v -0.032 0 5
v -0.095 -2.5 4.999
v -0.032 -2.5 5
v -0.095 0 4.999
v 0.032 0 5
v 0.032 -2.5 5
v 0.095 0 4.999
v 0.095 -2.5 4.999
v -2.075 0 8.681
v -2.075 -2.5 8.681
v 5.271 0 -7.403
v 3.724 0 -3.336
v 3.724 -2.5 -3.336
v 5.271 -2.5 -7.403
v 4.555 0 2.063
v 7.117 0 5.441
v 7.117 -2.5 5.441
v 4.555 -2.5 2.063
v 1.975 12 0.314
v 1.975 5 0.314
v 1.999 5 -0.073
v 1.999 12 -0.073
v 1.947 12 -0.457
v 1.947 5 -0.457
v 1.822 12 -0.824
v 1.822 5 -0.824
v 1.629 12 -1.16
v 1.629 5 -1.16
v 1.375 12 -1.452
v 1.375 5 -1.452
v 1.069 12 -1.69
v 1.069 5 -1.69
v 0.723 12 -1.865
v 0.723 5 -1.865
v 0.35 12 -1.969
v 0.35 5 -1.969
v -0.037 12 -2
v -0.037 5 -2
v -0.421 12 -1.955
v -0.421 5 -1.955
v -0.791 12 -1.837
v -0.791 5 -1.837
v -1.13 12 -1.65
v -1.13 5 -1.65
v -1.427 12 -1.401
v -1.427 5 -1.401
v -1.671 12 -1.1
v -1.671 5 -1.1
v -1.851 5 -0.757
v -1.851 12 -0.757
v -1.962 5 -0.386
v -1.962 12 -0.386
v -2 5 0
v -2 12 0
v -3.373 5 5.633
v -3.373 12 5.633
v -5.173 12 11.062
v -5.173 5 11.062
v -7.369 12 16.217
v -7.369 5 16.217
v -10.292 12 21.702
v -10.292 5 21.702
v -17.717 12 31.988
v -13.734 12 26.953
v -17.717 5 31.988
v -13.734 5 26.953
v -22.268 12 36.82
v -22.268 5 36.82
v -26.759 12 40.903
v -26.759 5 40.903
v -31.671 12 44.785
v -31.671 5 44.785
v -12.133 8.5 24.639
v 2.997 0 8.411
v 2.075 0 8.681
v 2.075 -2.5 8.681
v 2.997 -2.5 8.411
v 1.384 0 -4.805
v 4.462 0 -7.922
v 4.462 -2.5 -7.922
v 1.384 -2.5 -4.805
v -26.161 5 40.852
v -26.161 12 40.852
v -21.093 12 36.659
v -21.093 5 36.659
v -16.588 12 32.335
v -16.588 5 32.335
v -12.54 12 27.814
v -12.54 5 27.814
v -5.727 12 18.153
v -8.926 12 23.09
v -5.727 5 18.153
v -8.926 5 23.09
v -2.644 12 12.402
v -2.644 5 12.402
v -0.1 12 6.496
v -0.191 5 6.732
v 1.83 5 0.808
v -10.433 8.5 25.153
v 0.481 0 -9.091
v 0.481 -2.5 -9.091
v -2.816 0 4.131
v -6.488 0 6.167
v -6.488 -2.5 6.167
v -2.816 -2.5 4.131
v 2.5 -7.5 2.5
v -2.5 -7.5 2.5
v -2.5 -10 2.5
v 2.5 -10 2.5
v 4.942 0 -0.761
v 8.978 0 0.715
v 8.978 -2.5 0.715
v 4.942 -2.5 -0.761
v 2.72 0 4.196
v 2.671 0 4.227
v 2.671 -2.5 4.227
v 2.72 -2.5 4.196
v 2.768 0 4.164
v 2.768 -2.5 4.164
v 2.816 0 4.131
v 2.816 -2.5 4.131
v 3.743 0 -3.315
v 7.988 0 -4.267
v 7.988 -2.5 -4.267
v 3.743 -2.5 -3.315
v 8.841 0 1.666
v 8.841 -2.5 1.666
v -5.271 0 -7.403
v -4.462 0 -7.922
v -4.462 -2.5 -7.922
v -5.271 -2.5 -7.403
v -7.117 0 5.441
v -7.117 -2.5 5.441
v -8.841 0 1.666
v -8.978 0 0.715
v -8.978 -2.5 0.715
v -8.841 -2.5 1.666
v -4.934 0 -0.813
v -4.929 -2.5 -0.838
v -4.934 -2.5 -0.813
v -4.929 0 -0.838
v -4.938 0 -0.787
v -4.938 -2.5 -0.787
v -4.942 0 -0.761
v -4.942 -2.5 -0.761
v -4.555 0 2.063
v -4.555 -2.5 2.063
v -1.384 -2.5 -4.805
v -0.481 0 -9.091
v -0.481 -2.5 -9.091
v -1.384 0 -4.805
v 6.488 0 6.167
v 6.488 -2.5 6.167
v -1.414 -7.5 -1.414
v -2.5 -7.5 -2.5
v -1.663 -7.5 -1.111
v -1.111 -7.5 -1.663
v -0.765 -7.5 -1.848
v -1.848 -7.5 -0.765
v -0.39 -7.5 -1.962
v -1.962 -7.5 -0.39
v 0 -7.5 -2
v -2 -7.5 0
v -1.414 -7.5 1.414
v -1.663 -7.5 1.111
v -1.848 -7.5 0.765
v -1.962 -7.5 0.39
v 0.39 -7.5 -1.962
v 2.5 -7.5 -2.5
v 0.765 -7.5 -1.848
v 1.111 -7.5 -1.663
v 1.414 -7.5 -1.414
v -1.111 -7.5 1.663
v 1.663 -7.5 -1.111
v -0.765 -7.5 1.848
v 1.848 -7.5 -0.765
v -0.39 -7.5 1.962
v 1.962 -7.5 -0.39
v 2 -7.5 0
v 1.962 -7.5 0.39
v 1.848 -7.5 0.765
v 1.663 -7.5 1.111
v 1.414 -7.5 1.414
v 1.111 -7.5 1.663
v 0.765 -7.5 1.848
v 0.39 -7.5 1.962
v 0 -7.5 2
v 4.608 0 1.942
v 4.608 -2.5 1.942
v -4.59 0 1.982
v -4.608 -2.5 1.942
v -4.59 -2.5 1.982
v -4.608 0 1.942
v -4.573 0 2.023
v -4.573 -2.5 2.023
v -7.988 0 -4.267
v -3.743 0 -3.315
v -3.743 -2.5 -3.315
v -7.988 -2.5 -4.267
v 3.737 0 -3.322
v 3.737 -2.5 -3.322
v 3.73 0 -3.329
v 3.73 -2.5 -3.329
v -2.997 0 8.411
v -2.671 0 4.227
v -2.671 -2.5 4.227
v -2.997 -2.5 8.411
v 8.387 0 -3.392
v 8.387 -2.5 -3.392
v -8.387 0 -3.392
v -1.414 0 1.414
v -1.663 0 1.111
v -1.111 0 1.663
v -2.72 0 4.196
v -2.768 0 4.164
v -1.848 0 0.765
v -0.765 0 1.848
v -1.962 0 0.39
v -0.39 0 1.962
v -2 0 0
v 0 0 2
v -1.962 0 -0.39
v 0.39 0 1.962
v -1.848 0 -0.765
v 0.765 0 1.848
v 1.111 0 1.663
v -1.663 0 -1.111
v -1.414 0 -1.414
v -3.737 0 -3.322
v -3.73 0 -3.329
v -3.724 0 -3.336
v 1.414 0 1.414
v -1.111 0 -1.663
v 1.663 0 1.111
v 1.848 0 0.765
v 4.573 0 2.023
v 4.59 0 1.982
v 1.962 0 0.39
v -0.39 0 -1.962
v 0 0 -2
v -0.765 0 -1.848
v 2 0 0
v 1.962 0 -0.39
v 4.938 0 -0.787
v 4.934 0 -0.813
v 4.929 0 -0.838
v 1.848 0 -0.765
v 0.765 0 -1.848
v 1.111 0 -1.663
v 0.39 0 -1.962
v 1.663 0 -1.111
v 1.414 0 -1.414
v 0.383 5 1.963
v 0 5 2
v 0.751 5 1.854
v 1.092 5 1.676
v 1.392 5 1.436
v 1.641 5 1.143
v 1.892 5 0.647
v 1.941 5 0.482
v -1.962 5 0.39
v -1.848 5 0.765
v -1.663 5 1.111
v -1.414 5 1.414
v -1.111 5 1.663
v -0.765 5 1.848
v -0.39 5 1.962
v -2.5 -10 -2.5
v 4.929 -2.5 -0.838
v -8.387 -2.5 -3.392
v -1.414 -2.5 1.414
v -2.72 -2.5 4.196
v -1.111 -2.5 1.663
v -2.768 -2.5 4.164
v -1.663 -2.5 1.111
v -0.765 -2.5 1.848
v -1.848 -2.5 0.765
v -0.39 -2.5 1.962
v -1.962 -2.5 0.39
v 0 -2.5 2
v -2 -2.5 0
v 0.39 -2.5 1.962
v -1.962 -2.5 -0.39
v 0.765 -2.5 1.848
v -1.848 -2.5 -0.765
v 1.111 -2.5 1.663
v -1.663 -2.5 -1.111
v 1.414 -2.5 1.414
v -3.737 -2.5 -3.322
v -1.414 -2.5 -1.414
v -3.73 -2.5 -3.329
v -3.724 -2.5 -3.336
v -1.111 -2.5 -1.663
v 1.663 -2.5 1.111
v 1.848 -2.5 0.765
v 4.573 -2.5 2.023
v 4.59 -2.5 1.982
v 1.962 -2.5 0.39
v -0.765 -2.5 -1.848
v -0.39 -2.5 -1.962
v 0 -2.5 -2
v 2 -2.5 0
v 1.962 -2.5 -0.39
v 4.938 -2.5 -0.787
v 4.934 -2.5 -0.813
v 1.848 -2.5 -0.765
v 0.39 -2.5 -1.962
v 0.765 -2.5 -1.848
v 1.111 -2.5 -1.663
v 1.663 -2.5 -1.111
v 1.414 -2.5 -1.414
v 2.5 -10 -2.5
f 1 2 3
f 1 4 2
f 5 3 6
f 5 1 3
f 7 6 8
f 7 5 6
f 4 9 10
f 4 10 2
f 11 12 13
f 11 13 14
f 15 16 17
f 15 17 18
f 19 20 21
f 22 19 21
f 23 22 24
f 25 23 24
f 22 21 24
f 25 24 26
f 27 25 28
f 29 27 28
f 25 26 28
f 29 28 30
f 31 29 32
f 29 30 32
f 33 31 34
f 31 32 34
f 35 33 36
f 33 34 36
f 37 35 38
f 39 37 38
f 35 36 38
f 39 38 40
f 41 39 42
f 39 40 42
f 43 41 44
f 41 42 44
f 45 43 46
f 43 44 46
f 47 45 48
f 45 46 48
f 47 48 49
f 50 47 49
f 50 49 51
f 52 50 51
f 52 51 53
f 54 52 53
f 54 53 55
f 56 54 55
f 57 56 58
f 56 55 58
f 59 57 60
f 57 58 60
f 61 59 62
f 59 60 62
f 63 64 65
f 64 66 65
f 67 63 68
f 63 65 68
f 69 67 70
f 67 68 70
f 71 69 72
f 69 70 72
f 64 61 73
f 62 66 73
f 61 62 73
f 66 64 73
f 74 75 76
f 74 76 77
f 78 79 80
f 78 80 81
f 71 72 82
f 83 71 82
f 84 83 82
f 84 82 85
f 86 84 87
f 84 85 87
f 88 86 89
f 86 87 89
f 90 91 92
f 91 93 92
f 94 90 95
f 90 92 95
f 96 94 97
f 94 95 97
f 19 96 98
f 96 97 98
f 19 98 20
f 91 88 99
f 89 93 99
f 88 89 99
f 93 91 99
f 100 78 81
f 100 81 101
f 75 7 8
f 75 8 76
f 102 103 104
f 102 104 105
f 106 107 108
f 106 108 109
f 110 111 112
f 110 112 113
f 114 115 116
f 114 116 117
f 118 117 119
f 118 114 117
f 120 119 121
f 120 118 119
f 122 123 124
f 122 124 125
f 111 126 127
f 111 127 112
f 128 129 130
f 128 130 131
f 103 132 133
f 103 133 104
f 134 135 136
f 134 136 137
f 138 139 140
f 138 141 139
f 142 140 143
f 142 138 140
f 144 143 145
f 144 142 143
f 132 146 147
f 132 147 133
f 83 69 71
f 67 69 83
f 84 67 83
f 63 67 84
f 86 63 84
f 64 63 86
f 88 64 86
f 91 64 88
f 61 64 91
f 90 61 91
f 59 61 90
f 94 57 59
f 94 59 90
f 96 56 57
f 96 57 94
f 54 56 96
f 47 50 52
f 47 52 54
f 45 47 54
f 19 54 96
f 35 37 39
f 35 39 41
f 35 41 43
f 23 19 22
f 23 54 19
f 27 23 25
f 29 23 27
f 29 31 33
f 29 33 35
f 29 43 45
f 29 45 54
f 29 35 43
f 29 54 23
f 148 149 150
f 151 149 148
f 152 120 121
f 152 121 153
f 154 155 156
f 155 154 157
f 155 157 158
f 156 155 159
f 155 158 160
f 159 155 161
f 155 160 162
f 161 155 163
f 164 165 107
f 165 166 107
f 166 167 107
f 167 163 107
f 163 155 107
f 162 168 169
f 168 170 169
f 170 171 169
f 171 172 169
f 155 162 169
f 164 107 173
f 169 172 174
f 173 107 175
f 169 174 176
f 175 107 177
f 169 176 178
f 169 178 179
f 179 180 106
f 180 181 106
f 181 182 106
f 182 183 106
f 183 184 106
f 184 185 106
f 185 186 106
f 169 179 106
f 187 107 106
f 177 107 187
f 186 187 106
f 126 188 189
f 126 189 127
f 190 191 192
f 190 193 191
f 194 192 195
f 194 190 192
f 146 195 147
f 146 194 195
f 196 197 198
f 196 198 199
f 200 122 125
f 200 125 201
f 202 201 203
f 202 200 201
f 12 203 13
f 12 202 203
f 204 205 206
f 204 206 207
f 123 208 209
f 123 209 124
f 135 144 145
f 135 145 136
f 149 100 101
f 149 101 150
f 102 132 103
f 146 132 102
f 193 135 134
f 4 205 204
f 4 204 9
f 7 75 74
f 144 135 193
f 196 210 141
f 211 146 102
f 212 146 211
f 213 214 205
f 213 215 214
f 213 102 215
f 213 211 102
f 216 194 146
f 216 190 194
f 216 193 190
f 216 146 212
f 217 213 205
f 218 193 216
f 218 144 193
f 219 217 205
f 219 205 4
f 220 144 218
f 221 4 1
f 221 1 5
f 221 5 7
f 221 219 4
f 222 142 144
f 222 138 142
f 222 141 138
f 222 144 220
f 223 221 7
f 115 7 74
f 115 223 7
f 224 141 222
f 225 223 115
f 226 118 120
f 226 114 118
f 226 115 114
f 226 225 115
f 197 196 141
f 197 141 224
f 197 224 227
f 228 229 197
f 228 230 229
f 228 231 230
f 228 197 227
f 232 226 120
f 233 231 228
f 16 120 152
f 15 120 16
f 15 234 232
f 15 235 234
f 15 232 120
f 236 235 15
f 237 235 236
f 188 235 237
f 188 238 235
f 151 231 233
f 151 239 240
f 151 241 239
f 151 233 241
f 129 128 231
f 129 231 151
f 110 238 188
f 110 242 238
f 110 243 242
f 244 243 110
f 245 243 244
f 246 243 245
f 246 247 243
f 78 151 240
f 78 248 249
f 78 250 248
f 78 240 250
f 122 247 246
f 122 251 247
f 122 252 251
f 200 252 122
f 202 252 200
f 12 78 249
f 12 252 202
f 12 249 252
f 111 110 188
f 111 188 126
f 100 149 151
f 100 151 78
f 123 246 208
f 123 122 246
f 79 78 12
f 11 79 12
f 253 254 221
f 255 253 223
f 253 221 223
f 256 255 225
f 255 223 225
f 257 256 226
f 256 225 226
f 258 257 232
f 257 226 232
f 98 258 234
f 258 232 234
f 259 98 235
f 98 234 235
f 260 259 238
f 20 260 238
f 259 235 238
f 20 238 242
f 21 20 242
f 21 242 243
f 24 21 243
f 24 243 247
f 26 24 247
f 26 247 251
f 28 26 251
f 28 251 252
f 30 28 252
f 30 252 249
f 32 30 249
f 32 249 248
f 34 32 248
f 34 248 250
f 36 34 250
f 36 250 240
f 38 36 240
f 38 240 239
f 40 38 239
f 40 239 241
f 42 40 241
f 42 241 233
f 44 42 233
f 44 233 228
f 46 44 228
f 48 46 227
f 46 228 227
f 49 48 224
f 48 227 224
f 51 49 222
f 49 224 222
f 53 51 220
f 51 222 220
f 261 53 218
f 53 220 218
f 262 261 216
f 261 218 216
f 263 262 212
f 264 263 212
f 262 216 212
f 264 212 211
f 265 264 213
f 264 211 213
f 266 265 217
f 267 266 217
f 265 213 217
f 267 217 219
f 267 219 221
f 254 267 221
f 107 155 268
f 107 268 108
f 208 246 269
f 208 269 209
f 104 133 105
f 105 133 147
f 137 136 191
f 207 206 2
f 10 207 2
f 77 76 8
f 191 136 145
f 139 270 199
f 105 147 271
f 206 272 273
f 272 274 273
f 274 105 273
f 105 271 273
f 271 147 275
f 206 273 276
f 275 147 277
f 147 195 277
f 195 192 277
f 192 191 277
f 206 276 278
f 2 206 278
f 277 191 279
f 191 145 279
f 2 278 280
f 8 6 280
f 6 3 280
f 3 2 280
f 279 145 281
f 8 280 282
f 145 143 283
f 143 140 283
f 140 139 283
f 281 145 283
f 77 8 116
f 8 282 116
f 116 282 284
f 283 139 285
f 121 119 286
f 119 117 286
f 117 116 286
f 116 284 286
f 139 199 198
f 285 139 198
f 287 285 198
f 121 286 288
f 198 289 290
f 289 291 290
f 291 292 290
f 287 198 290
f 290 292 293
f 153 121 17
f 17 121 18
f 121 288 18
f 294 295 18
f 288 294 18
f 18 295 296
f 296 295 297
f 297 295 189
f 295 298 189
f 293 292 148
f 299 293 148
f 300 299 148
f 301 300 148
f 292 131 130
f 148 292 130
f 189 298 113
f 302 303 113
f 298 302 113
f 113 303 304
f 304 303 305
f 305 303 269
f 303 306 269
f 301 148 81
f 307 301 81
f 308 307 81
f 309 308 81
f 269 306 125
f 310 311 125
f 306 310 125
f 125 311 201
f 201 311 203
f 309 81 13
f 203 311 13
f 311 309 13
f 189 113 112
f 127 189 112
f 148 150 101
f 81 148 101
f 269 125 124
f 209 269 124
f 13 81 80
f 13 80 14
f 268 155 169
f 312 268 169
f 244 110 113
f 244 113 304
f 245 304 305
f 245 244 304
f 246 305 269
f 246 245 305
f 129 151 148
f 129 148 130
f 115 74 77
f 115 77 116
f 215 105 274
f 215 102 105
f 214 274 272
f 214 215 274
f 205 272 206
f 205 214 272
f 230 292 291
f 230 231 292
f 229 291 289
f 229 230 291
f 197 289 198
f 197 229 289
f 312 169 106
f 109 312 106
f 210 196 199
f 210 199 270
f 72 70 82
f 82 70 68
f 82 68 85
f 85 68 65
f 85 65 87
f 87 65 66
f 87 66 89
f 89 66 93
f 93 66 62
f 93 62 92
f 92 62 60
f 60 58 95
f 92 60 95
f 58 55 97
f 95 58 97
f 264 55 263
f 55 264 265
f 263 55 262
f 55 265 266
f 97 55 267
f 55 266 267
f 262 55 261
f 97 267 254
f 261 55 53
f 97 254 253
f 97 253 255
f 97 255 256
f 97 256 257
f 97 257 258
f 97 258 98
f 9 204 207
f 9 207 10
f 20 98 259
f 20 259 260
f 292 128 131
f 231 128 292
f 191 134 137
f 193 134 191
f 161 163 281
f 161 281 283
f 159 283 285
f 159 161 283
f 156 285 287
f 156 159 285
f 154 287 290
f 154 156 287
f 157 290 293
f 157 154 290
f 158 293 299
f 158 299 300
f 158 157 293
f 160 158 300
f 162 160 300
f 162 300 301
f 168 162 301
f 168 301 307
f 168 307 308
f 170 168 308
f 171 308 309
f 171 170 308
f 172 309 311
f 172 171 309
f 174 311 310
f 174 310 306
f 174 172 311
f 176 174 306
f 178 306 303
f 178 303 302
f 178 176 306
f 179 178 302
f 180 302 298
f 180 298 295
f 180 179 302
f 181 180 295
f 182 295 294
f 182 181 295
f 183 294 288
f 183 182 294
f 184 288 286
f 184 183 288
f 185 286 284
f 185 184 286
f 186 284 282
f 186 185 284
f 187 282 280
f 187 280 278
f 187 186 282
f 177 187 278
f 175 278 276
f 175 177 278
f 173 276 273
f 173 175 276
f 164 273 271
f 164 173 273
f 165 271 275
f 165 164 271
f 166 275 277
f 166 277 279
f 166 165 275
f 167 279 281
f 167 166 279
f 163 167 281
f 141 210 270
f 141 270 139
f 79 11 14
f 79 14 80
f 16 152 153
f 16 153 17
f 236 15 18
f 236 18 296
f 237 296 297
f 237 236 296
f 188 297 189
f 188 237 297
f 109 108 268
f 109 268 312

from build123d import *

# Parameters (mm, degrees)
ESQUISSE1_R             = 2
BOSS_EXTRU_1_DEPTH      = 5
ESQUISSE2_W             = 10
ESQUISSE2_H             = 10
BOSS_EXTRU_2_DEPTH      = 2.5
BOSS_EXTRU_3_DEPTH      = 7
BOSS_EXTRU_4_START      = 5
ESQUISSE5_R             = 2
BOSS_EXTRU_4_DEPTH      = 5
ESQUISSE6_W             = 5
ESQUISSE6_H             = 5
BOSS_EXTRU_5_DEPTH      = 2.5
ESQUISSE7_R             = 7.071067812
ESQUISSE7_R_2           = 5
ENL_V_MAT_EXTRU_1_DEPTH = 2.5
BOSS_EXTRU_6_DEPTH      = 2.5


# Read off the part's stored shape, not the designer's step: Boss.-Extru.3
with BuildPart() as part:
    # Esquisse1 → Boss.-Extru.1 (new body)
    with BuildSketch(Plane(origin=(0, 0, 0), x_dir=(1, 0, 0), z_dir=(0, 1, 0))):
        with Locations(Location((0, 0, 0), (0, 0, 270))):
            Circle(ESQUISSE1_R)
    extrude(amount=BOSS_EXTRU_1_DEPTH)

    # Esquisse2 → Boss.-Extru.2 (add)
    with BuildSketch(Plane.XZ):
        Rectangle(ESQUISSE2_W, ESQUISSE2_H)
    extrude(amount=BOSS_EXTRU_2_DEPTH)

    # Boss.-Extru.3 outline → Boss.-Extru.3 (add)
    with BuildSketch(Plane(origin=(0, 5, 0), x_dir=(1, 0, 0), z_dir=(0, 1, 0))):
        with BuildLine():
            ThreePointArc((1.9752398, -0.313731942), (0.157353741, 1.993800341), (-2, 0))
            add(Edge.make_bspline(
                [(-2, 0), (-7.431064096, -26.884767596), (-31.670728762, -44.785499484)],
                knots=[0, 0, 0, 1, 1, 1], degree=2))
            add(Edge.make_bspline(
                [(-31.670728762, -44.785499484), (-6.018007313, -27.755724693), (1.9752398, -0.313731942)],
                knots=[0.009012394, 0.009012394, 0.009012394, 1.009012394, 1.009012394, 1.009012394], degree=2))
        make_face()
    extrude(amount=BOSS_EXTRU_3_DEPTH)

    # Esquisse5 → Boss.-Extru.4 (add)
    with BuildSketch(Plane.XZ.offset(2.5).offset(BOSS_EXTRU_4_START)):
        with Locations(Location((0, 0, 0), (0, 0, 180))):
            Circle(ESQUISSE5_R)
    extrude(amount=-BOSS_EXTRU_4_DEPTH)

    # Esquisse6 → Boss.-Extru.5 (add)
    with BuildSketch(Plane.XZ.offset(7.5)):
        Rectangle(ESQUISSE6_W, ESQUISSE6_H)
    extrude(amount=BOSS_EXTRU_5_DEPTH)

    # Esquisse7 → Enlèv. mat.-Extru.1 (cut)
    with BuildSketch(Plane(origin=(0, 0, 0), x_dir=(1, 0, 0), z_dir=(0, 1, 0))):
        Circle(ESQUISSE7_R)
        with Locations(Location((0, 0, 0), (0, 0, 270))):
            Circle(ESQUISSE7_R_2, mode=Mode.SUBTRACT)
    extrude(amount=-ENL_V_MAT_EXTRU_1_DEPTH, mode=Mode.SUBTRACT)

    # Esquisse8 → Boss.-Extru.6 (add)
    with BuildSketch(Plane(origin=(0, 0, 0), x_dir=(1, 0, 0), z_dir=(0, 1, 0))):
        with BuildLine():
            Line((0.480722973, 9.091466817), (-0.480722973, 9.091466817))
            Line((-0.480722973, 9.091466817), (-1.384203057, 4.804579263))
            ThreePointArc((-1.384203057, 4.804579263), (0, 5), (1.384203057, 4.804579263))
            Line((1.384203057, 4.804579263), (0.480722973, 9.091466817))
        make_face()
        with BuildLine():
            ThreePointArc((-3.724002251, 3.336436308), (-2.657499069, 4.235292044), (-1.384203057, 4.804579263))
            Line((-1.384203057, 4.804579263), (-4.46192526, 7.922480352))
            Line((-4.46192526, 7.922480352), (-5.270745059, 7.40268343))
            Line((-5.270745059, 7.40268343), (-3.724002251, 3.336436308))
        make_face()
        with BuildLine():
            ThreePointArc((-4.929206832, 0.838403251), (-4.509599896, 2.159515866), (-3.743401614, 3.314655994))
            Line((-3.743401614, 3.314655994), (-7.98794375, 4.266868977))
            Line((-7.98794375, 4.266868977), (-8.38734283, 3.392306983))
            Line((-8.38734283, 3.392306983), (-4.929206832, 0.838403251))
        make_face()
        with BuildLine():
            ThreePointArc((-4.607625844, -1.941593182), (-4.962215179, -0.613531185), (-4.941763812, 0.760901064))
            Line((-4.941763812, 0.760901064), (-8.977846539, -0.714736526))
            Line((-8.977846539, -0.714736526), (-8.841018515, -1.666396338))
            Line((-8.841018515, -1.666396338), (-4.607625844, -1.941593182))
        make_face()
        with BuildLine():
            ThreePointArc((-2.816176348, -4.131482879), (-3.827716111, -3.216922344), (-4.554529885, -2.063069927))
            Line((-4.554529885, -2.063069927), (-7.117346486, -5.440711607))
            Line((-7.117346486, -5.440711607), (-6.487733289, -6.167323972))
            Line((-6.487733289, -6.167323972), (-2.816176348, -4.131482879))
        make_face()
        with BuildLine():
            Line((2.997139213, -8.410592571), (2.670641872, -4.227016914))
            ThreePointArc((2.670641872, -4.227016914), (1.435603167, -4.789472158), (0.094807796, -4.999101067))
            Line((0.094807796, -4.999101067), (2.074638584, -8.681463196))
            Line((2.074638584, -8.681463196), (2.997139213, -8.410592571))
        make_face()
        with BuildLine():
            Line((7.117346486, -5.440711607), (4.554529885, -2.063069927))
            ThreePointArc((4.554529885, -2.063069927), (3.827716111, -3.216922344), (2.816176348, -4.131482879))
            Line((2.816176348, -4.131482879), (6.487733289, -6.167323972))
            Line((6.487733289, -6.167323972), (7.117346486, -5.440711607))
        make_face()
        with BuildLine():
            Line((8.977846539, -0.714736526), (4.941763812, 0.760901064))
            ThreePointArc((4.941763812, 0.760901064), (4.985419694, 0.381563193), (5, 0))
            ThreePointArc((5, 0), (4.900924873, -0.990421825), (4.607625844, -1.941593182))
            Line((4.607625844, -1.941593182), (8.841018515, -1.666396338))
            Line((8.841018515, -1.666396338), (8.977846539, -0.714736526))
        make_face()
        with BuildLine():
            Line((7.98794375, 4.266868977), (3.743401614, 3.314655994))
            ThreePointArc((3.743401614, 3.314655994), (4.509599896, 2.159515866), (4.929206832, 0.838403251))
            Line((4.929206832, 0.838403251), (8.38734283, 3.392306983))
            Line((8.38734283, 3.392306983), (7.98794375, 4.266868977))
        make_face()
        with BuildLine():
            Line((4.46192526, 7.922480352), (1.384203057, 4.804579263))
            ThreePointArc((1.384203057, 4.804579263), (2.657499069, 4.235292044), (3.724002251, 3.336436308))
            Line((3.724002251, 3.336436308), (5.270745059, 7.40268343))
            Line((5.270745059, 7.40268343), (4.46192526, 7.922480352))
        make_face()
        with BuildLine():
            ThreePointArc((-0.094807796, -4.999101067), (-1.435603167, -4.789472158), (-2.670641872, -4.227016914))
            Line((-2.670641872, -4.227016914), (-2.997139213, -8.410592571))
            Line((-2.997139213, -8.410592571), (-2.074638584, -8.681463196))
            Line((-2.074638584, -8.681463196), (-0.094807796, -4.999101067))
        make_face()
    extrude(amount=-BOSS_EXTRU_6_DEPTH)


solid = part.part
